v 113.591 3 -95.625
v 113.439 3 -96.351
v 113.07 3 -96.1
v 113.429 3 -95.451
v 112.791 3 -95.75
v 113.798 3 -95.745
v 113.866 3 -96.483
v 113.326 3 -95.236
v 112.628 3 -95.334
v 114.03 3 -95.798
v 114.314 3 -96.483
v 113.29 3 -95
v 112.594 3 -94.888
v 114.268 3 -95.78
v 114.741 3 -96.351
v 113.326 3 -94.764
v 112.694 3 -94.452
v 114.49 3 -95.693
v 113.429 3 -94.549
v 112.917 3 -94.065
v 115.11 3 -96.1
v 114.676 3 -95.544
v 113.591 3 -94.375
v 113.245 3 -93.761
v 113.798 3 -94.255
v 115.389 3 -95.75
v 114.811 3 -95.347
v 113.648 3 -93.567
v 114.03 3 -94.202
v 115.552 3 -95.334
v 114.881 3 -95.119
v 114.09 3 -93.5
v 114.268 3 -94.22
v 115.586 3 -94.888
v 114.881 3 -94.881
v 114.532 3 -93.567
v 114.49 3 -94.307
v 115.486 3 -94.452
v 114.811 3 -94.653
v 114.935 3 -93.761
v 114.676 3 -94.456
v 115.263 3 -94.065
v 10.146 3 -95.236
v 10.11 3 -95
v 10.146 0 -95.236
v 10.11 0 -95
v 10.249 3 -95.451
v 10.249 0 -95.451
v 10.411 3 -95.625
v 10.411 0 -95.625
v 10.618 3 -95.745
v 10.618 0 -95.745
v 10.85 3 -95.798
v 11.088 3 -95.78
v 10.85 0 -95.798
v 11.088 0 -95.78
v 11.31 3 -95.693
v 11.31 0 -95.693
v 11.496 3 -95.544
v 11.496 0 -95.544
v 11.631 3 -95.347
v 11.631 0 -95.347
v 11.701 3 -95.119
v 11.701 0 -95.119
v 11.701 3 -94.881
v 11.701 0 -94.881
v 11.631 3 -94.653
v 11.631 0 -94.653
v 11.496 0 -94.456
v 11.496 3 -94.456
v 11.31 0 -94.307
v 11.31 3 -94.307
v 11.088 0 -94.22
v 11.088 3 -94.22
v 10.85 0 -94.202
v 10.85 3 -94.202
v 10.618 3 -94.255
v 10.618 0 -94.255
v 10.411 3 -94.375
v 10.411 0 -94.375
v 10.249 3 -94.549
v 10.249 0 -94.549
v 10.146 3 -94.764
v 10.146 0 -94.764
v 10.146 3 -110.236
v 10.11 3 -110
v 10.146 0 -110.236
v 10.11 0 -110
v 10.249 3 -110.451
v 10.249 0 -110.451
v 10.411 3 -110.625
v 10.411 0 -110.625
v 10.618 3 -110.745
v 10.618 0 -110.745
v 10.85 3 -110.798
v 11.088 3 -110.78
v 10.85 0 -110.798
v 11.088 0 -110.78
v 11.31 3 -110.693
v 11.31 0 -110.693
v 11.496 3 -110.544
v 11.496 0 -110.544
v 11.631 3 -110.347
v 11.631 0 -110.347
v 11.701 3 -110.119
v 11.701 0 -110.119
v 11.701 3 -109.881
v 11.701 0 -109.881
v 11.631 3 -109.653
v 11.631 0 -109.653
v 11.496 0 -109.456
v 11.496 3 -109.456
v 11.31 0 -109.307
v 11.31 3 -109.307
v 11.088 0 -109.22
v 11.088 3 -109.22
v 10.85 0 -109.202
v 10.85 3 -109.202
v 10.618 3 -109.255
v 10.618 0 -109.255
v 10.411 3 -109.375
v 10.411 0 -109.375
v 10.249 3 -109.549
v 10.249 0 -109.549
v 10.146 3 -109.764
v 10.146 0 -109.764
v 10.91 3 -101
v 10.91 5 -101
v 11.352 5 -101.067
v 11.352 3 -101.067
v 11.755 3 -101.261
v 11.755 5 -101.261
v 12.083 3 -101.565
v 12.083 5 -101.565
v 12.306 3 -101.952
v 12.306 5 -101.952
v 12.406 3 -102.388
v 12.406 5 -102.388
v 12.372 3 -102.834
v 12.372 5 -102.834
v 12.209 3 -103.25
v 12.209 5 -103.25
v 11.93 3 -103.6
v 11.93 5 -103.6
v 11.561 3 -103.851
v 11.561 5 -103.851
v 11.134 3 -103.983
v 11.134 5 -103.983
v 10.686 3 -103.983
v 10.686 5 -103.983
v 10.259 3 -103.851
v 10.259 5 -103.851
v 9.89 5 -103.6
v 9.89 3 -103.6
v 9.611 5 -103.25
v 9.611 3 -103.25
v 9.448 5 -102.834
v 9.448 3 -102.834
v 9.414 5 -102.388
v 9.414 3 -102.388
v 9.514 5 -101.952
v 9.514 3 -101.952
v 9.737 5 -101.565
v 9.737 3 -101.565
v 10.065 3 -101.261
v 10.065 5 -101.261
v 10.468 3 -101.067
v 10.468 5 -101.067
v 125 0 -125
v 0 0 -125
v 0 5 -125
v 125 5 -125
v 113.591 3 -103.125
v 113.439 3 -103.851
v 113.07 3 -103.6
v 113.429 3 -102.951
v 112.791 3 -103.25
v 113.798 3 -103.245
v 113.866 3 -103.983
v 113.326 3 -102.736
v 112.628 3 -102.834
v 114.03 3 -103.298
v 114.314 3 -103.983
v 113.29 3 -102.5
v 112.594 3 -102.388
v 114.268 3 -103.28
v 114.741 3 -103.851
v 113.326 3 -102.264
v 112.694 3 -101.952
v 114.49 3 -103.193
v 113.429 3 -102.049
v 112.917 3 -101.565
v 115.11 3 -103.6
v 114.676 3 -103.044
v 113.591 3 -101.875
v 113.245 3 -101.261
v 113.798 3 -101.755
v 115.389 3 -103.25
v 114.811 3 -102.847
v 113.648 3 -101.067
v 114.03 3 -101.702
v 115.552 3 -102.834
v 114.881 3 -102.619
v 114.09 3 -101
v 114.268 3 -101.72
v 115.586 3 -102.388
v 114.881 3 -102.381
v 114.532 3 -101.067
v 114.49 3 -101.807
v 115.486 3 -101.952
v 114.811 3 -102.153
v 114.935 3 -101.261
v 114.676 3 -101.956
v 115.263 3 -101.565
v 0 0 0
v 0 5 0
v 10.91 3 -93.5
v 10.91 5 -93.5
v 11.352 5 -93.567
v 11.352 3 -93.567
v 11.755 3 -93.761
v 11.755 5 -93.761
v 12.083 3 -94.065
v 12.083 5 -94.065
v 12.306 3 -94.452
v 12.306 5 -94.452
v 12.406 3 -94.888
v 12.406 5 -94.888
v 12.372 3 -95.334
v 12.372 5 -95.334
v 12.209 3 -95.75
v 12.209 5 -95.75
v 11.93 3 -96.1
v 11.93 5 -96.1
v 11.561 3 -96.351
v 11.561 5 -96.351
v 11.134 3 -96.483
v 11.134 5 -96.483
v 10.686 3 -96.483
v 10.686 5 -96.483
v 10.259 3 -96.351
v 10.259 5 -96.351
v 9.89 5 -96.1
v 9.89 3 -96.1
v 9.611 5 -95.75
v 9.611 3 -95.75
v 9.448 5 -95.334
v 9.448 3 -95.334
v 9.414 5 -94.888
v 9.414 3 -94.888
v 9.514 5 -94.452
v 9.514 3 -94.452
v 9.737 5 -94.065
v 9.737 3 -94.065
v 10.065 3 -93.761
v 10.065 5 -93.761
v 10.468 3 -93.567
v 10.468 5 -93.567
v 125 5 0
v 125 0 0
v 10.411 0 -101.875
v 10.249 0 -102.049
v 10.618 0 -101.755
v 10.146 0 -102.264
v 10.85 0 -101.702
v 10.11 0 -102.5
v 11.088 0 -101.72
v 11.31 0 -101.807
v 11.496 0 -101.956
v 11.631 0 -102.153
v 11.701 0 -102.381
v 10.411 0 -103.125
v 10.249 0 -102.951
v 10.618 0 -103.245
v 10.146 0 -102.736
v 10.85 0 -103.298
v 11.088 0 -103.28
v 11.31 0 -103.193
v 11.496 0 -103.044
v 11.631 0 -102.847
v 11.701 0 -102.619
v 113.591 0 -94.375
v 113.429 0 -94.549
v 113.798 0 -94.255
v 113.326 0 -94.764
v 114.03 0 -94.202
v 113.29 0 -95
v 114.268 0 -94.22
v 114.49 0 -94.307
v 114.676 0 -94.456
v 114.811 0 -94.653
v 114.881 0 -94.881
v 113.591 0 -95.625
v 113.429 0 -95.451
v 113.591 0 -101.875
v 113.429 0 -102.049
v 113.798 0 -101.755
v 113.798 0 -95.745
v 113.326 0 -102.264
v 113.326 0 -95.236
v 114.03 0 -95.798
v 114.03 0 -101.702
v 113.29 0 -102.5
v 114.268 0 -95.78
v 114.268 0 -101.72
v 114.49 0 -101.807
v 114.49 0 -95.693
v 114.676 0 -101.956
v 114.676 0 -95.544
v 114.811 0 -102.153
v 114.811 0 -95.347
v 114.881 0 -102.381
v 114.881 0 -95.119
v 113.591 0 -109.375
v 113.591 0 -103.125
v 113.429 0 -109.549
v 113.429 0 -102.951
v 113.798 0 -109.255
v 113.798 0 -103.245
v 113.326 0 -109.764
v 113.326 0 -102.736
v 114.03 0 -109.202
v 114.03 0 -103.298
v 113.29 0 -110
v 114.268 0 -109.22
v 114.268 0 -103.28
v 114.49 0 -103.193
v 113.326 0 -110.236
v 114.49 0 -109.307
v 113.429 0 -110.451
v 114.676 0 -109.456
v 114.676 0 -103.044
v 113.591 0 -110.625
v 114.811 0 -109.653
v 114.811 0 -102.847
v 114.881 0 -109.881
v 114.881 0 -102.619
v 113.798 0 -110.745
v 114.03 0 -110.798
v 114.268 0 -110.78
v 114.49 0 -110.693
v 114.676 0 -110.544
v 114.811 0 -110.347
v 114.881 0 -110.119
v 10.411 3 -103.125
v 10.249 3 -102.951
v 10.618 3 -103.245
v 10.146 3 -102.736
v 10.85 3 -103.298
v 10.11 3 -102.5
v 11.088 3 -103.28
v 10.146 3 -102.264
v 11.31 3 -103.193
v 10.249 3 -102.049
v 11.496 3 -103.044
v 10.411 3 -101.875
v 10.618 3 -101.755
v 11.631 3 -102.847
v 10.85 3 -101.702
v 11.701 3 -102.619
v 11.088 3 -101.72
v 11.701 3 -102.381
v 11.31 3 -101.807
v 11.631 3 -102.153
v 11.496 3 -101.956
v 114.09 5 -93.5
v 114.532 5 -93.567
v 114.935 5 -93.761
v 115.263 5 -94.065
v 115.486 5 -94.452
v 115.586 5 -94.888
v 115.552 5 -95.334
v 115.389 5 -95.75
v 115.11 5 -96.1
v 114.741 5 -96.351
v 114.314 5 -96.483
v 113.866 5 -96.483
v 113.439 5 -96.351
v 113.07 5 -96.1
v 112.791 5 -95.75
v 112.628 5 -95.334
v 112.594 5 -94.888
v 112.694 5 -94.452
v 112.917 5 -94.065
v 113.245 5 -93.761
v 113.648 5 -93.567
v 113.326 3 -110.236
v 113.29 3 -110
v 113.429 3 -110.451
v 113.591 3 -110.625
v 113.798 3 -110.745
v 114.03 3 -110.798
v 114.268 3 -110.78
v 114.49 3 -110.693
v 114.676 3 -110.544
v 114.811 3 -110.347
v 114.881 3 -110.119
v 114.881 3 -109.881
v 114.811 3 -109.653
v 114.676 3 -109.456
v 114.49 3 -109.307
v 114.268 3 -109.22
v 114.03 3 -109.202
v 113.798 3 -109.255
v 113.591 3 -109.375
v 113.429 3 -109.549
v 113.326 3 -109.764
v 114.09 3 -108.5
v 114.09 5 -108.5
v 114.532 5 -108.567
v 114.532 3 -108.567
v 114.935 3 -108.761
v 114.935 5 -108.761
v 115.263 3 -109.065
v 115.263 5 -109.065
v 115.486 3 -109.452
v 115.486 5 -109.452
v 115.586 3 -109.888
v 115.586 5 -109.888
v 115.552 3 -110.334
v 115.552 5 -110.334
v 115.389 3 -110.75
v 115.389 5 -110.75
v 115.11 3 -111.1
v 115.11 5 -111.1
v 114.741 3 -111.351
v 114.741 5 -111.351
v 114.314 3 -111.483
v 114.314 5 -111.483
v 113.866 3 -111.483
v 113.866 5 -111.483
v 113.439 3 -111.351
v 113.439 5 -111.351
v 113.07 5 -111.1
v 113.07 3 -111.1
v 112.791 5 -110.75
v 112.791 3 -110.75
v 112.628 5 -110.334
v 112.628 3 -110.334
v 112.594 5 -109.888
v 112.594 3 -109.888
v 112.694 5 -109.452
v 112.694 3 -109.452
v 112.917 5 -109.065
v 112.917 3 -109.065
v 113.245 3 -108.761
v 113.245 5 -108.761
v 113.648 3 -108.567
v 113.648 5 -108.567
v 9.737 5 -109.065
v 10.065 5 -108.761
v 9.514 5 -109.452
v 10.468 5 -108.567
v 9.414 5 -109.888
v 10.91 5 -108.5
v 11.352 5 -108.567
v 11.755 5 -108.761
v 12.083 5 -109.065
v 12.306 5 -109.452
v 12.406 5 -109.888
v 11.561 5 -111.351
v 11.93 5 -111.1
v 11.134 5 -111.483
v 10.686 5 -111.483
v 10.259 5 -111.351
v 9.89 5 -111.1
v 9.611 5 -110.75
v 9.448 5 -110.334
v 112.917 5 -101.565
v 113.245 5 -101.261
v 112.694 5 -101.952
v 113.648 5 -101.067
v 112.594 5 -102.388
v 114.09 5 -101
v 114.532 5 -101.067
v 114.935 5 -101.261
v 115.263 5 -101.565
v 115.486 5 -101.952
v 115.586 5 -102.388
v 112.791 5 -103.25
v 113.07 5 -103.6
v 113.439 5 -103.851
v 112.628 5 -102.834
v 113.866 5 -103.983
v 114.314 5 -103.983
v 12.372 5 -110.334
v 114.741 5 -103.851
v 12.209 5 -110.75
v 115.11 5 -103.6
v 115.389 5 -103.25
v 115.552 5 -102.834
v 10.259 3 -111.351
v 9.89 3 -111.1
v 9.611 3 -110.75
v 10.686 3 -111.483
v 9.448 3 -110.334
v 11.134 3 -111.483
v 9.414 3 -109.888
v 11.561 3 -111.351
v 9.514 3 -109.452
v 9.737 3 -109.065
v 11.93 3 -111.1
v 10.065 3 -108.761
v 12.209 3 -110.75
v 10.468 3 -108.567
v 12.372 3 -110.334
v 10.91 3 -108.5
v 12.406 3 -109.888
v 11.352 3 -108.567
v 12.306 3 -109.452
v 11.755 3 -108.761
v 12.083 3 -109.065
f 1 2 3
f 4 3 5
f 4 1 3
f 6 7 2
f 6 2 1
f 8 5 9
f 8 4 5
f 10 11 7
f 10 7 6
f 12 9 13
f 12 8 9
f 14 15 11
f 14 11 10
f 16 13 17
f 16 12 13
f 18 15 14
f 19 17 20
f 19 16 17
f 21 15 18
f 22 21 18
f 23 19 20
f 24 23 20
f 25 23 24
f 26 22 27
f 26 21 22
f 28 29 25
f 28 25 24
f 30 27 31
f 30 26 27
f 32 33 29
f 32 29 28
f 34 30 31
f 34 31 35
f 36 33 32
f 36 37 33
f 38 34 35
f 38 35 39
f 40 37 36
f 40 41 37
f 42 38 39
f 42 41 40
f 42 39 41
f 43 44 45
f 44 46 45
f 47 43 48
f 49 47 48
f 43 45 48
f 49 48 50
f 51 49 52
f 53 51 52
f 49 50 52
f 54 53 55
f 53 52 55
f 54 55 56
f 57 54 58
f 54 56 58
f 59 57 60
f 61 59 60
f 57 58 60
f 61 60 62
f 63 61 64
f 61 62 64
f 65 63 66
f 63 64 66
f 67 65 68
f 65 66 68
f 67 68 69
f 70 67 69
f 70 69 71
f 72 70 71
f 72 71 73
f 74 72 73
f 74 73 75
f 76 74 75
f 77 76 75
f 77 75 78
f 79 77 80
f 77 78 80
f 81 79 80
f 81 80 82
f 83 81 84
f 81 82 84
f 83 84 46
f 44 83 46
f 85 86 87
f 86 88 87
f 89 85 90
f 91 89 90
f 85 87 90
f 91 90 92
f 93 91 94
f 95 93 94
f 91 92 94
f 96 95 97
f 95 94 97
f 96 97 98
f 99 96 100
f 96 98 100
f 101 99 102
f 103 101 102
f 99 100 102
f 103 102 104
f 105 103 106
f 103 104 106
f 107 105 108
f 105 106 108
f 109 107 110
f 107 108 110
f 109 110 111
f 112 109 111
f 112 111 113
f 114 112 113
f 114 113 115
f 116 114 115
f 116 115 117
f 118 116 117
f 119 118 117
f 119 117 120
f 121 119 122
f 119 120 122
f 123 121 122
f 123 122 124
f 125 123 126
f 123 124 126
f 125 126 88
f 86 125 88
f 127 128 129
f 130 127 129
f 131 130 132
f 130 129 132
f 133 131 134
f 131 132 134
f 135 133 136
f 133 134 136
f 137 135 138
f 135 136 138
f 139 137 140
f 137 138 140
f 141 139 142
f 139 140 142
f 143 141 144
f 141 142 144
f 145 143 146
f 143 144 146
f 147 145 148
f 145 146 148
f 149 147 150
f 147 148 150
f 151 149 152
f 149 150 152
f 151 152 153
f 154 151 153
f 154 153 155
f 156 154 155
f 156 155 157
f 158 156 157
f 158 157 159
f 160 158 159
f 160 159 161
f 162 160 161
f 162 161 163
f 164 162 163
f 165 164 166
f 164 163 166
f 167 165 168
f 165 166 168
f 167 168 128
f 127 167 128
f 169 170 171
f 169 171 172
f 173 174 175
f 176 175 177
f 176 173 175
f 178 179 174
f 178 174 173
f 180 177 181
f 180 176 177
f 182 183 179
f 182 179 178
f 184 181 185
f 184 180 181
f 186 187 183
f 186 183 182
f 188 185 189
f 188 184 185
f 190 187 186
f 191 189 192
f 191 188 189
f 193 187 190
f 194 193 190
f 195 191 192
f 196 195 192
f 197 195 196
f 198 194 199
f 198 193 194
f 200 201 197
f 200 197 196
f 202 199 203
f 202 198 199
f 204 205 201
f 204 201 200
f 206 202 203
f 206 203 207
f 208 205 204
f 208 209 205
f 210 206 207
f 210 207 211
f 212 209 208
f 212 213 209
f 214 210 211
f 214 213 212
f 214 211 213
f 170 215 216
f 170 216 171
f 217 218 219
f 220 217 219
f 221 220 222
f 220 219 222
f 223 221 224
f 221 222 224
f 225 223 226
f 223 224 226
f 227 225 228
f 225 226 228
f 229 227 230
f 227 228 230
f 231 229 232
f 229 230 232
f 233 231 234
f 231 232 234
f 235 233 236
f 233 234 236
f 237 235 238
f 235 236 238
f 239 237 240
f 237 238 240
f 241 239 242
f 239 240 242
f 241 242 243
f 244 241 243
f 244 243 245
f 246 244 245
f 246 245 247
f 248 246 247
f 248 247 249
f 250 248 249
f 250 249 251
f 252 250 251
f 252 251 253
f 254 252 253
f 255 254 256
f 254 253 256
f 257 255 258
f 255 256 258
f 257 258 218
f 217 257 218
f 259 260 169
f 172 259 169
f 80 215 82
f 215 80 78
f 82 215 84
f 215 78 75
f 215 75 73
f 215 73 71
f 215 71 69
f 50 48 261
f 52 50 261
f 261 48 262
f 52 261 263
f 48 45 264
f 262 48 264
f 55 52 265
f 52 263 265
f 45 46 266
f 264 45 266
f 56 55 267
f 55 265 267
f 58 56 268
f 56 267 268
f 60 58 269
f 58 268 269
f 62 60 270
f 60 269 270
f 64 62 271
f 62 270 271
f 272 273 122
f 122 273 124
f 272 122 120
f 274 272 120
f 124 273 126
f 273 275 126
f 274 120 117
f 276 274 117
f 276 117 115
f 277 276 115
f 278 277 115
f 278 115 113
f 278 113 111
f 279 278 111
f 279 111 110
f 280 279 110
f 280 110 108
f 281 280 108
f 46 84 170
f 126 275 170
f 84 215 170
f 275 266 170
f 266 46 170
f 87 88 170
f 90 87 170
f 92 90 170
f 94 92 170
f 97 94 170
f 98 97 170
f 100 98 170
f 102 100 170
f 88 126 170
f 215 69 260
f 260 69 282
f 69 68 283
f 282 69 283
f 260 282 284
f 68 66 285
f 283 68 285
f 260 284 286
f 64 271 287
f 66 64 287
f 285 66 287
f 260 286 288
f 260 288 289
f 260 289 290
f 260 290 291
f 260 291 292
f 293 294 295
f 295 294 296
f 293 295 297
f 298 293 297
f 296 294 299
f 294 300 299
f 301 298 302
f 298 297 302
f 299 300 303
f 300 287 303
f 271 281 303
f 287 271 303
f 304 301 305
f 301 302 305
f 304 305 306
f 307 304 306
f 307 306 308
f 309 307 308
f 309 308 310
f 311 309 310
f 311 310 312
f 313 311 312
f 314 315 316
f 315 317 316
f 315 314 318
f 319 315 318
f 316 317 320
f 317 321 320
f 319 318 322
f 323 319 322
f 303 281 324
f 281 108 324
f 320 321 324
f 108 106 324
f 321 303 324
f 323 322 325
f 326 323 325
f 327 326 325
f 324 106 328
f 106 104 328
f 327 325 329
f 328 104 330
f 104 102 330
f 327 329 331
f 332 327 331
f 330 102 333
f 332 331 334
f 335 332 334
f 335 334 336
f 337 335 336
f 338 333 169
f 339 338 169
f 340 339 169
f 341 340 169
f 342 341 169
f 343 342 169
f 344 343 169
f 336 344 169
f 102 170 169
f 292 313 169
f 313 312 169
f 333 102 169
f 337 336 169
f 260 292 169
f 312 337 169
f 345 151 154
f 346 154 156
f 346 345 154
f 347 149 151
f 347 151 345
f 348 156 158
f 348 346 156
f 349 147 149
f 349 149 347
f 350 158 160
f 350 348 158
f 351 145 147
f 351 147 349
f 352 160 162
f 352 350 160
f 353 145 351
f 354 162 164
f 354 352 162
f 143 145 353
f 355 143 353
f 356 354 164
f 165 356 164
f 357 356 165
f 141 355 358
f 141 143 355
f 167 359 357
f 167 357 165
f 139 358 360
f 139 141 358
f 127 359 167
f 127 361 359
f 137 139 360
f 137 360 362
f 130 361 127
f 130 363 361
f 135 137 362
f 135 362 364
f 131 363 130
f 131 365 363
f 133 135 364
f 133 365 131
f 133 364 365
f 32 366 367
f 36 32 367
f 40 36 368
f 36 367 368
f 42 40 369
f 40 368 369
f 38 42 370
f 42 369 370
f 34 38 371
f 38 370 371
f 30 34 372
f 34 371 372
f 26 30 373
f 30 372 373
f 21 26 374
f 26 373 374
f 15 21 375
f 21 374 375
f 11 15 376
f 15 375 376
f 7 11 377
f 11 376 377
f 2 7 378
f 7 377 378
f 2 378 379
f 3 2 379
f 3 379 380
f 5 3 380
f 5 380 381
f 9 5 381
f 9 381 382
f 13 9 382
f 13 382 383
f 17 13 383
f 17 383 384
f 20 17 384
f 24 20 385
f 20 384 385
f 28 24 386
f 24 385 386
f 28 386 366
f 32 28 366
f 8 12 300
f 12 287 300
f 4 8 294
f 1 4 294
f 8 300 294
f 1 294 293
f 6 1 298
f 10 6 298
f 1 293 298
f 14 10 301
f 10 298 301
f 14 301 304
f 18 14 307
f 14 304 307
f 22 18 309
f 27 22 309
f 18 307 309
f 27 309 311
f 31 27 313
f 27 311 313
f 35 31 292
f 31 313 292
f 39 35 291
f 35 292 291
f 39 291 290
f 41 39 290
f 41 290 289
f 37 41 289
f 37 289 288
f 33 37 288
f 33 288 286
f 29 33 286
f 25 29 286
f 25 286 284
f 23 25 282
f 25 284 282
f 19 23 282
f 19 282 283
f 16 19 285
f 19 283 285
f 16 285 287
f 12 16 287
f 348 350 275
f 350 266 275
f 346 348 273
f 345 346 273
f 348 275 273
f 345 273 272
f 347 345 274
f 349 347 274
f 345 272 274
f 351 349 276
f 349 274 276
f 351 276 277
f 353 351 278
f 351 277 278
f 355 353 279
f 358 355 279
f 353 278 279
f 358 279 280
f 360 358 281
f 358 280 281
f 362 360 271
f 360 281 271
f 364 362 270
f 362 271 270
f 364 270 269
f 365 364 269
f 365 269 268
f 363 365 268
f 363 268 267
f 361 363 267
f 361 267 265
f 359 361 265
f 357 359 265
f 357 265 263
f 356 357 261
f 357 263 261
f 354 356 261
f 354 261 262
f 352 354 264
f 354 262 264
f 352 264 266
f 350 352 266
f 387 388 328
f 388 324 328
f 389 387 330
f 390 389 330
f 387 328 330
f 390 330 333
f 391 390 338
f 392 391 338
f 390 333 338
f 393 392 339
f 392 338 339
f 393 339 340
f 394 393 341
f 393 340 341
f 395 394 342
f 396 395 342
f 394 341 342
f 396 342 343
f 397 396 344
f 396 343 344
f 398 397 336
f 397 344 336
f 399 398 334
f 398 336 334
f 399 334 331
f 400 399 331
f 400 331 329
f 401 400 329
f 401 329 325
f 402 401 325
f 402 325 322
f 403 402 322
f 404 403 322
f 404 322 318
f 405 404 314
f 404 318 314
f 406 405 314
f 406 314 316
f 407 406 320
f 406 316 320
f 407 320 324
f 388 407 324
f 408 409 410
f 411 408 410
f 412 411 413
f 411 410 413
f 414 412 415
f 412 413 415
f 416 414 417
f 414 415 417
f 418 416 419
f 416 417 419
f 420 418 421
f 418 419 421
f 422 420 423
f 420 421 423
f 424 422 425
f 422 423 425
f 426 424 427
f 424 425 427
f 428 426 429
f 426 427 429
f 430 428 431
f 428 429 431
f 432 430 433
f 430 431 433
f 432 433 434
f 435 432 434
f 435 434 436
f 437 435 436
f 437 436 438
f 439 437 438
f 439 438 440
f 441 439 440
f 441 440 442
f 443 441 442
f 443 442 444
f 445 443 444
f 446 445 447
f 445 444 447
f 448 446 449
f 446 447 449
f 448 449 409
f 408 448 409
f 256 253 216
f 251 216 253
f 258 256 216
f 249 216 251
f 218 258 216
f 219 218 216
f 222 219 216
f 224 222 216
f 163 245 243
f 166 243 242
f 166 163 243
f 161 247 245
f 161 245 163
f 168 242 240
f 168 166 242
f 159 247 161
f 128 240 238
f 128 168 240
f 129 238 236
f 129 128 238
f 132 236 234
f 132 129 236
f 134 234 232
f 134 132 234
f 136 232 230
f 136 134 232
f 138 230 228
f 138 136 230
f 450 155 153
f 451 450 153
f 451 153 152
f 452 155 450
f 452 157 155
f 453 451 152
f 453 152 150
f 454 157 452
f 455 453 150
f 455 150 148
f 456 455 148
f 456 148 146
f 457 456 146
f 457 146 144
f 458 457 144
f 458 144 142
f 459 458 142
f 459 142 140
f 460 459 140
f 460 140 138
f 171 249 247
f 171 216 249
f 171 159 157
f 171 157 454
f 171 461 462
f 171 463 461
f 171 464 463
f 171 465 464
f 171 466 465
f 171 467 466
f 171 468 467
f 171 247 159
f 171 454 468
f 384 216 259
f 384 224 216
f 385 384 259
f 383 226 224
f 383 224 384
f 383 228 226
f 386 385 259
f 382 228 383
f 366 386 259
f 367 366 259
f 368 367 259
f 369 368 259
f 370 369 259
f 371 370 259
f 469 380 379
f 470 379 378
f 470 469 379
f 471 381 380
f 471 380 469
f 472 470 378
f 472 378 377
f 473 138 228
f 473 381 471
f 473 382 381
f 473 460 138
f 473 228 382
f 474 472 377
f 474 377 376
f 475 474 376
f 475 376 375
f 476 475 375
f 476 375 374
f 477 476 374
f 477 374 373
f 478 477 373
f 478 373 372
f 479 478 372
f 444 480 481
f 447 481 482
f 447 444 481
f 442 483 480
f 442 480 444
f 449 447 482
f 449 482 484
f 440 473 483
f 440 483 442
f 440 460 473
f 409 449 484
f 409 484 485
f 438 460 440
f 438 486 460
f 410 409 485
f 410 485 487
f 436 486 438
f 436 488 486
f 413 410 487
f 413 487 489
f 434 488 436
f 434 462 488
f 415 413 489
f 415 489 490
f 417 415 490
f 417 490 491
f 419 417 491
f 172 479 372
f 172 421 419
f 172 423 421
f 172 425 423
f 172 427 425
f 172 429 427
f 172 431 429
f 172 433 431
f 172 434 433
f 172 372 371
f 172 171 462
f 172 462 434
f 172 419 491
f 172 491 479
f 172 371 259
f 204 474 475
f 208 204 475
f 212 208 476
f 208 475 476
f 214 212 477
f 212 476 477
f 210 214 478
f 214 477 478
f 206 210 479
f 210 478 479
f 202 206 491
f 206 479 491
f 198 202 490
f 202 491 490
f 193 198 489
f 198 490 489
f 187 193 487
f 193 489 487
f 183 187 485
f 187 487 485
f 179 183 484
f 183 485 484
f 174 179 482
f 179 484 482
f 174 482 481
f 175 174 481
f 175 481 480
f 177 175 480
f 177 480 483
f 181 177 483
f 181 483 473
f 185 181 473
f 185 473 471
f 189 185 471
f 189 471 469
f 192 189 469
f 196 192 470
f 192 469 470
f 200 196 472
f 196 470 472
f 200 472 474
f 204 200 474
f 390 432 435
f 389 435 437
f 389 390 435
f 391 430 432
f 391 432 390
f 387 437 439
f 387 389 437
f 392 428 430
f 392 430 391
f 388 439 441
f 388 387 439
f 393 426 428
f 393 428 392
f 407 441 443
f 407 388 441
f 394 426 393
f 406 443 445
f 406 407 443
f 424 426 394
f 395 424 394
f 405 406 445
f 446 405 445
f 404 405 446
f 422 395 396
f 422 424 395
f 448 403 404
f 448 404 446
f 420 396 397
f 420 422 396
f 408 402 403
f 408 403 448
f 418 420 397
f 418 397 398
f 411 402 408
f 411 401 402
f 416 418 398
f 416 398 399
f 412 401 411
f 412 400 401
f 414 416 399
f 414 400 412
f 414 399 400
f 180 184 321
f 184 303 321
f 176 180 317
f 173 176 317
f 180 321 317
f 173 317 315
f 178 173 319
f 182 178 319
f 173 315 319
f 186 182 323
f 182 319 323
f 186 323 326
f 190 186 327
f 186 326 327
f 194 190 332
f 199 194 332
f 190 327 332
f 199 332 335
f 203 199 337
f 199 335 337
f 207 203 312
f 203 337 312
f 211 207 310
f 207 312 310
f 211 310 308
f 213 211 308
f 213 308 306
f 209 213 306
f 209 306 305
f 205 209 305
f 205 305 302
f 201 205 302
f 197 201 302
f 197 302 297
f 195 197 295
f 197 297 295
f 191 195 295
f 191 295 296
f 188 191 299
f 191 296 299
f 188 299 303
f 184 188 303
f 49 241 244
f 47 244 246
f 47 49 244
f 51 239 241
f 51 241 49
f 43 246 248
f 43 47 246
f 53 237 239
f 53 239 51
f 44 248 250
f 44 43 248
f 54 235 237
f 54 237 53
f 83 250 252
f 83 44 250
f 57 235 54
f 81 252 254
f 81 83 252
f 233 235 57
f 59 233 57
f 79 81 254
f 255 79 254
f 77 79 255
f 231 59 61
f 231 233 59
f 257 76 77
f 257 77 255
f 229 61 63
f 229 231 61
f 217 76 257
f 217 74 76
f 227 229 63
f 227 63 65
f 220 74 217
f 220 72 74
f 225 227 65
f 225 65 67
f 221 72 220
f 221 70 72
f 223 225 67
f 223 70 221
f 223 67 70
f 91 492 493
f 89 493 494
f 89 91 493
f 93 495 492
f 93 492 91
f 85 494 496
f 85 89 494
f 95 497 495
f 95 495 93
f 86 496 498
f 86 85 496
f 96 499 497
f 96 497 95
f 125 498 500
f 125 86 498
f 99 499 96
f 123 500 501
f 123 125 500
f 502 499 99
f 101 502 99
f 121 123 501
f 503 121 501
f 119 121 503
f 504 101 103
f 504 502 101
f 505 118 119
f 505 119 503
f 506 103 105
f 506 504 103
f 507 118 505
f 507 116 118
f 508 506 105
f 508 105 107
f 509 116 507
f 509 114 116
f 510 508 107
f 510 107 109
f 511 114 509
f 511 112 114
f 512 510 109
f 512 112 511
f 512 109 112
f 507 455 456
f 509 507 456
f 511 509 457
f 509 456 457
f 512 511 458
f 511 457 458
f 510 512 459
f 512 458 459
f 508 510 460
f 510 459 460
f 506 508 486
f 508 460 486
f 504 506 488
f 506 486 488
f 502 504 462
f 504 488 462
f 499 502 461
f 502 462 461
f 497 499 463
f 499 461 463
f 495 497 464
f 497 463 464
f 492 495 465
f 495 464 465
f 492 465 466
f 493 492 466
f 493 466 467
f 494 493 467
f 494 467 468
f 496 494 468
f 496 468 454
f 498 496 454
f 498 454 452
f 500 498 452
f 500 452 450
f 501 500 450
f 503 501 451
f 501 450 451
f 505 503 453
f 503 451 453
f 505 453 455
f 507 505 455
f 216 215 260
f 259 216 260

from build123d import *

# Parameters (mm, degrees)
SKETCH1_W                             = 125
SKETCH1_H                             = 125
BOSS_EXTRUDE1_DEPTH                   = 5
SKETCH2_R                             = 1.5
CUT_EXTRUDE1_DEPTH                    = 2
TAP_DRILL_FOR_M2X0_4_TAP1_D           = 1.6
TAP_DRILL_FOR_M2X0_4_TAP1_CSINK_D     = 1.65
TAP_DRILL_FOR_M2X0_4_TAP1_CSINK_ANGLE = 90


with BuildPart() as part:
    # Sketch1 → Boss-Extrude1 (new body)
    with BuildSketch(Plane(origin=(0, 0, 0), x_dir=(1, 0, 0), z_dir=(0, 1, 0))):
        with Locations((62.5, 62.5)):
            Rectangle(SKETCH1_W, SKETCH1_H)
    extrude(amount=BOSS_EXTRUDE1_DEPTH)

    # Sketch2 → Cut-Extrude1 (cut)
    with BuildSketch(Plane(origin=(0, 5, 0), x_dir=(1, 0, 0), z_dir=(0, 1, 0))):
        with Locations(Location((10.91, 95, 0), (0, 0, 270))):
            Circle(SKETCH2_R)
        with Locations(Location((10.91, 110, 0), (0, 0, 270))):
            Circle(SKETCH2_R)
        with Locations(Location((114.09, 110, 0), (0, 0, 270))):
            Circle(SKETCH2_R)
        with Locations(Location((114.09, 95, 0), (0, 0, 270))):
            Circle(SKETCH2_R)
        with Locations(Location((114.09, 102.5, 0), (0, 0, 270))):
            Circle(SKETCH2_R)
        with Locations(Location((10.91, 102.5, 0), (0, 0, 270))):
            Circle(SKETCH2_R)
    extrude(amount=-CUT_EXTRUDE1_DEPTH, mode=Mode.SUBTRACT)

    # Tap Drill for M2x0.4 Tap1 (through all)
    with Locations(Plane(origin=(0, 5, 0), x_dir=(1, 0, 0), z_dir=(0, 1, 0))):
        with Locations((10.91, 95), (10.91, 110), (114.09, 110), (114.09, 95), (10.91, 102.5), (114.09, 102.5)):
            CounterSinkHole(TAP_DRILL_FOR_M2X0_4_TAP1_D / 2, TAP_DRILL_FOR_M2X0_4_TAP1_CSINK_D / 2, counter_sink_angle=TAP_DRILL_FOR_M2X0_4_TAP1_CSINK_ANGLE)


solid = part.part
